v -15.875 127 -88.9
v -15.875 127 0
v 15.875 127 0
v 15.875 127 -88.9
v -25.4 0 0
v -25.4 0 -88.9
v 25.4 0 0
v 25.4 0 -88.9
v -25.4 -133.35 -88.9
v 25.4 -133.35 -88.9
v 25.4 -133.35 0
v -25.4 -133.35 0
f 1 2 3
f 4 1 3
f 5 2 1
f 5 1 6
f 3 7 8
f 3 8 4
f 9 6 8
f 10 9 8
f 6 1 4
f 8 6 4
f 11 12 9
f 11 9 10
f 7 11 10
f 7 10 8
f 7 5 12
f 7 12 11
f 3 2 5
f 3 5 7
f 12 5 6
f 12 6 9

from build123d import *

# Parameters (mm, degrees)
F0_W     = 31.75
F0_H     = 127
F1_DEPTH = 88.9


with BuildPart() as f1:
    # F0 (on Top) → F1 (new body)
    with BuildSketch(Plane.XY):
        with Locations((0, 63.5)):
            Rectangle(F0_W, F0_H)
        Polygon((-15.875, 0), (-25.4, 0), (-25.4, -133.35), (25.4, -133.35), (25.4, 0), (15.875, 0), align=None)
        Polygon((15.875, 127), (15.875, 0), (25.4, 0), align=None)
        Polygon((-15.875, 127), (-25.4, 0), (-15.875, 0), align=None)
    extrude(amount=-F1_DEPTH)


solid = f1.part
